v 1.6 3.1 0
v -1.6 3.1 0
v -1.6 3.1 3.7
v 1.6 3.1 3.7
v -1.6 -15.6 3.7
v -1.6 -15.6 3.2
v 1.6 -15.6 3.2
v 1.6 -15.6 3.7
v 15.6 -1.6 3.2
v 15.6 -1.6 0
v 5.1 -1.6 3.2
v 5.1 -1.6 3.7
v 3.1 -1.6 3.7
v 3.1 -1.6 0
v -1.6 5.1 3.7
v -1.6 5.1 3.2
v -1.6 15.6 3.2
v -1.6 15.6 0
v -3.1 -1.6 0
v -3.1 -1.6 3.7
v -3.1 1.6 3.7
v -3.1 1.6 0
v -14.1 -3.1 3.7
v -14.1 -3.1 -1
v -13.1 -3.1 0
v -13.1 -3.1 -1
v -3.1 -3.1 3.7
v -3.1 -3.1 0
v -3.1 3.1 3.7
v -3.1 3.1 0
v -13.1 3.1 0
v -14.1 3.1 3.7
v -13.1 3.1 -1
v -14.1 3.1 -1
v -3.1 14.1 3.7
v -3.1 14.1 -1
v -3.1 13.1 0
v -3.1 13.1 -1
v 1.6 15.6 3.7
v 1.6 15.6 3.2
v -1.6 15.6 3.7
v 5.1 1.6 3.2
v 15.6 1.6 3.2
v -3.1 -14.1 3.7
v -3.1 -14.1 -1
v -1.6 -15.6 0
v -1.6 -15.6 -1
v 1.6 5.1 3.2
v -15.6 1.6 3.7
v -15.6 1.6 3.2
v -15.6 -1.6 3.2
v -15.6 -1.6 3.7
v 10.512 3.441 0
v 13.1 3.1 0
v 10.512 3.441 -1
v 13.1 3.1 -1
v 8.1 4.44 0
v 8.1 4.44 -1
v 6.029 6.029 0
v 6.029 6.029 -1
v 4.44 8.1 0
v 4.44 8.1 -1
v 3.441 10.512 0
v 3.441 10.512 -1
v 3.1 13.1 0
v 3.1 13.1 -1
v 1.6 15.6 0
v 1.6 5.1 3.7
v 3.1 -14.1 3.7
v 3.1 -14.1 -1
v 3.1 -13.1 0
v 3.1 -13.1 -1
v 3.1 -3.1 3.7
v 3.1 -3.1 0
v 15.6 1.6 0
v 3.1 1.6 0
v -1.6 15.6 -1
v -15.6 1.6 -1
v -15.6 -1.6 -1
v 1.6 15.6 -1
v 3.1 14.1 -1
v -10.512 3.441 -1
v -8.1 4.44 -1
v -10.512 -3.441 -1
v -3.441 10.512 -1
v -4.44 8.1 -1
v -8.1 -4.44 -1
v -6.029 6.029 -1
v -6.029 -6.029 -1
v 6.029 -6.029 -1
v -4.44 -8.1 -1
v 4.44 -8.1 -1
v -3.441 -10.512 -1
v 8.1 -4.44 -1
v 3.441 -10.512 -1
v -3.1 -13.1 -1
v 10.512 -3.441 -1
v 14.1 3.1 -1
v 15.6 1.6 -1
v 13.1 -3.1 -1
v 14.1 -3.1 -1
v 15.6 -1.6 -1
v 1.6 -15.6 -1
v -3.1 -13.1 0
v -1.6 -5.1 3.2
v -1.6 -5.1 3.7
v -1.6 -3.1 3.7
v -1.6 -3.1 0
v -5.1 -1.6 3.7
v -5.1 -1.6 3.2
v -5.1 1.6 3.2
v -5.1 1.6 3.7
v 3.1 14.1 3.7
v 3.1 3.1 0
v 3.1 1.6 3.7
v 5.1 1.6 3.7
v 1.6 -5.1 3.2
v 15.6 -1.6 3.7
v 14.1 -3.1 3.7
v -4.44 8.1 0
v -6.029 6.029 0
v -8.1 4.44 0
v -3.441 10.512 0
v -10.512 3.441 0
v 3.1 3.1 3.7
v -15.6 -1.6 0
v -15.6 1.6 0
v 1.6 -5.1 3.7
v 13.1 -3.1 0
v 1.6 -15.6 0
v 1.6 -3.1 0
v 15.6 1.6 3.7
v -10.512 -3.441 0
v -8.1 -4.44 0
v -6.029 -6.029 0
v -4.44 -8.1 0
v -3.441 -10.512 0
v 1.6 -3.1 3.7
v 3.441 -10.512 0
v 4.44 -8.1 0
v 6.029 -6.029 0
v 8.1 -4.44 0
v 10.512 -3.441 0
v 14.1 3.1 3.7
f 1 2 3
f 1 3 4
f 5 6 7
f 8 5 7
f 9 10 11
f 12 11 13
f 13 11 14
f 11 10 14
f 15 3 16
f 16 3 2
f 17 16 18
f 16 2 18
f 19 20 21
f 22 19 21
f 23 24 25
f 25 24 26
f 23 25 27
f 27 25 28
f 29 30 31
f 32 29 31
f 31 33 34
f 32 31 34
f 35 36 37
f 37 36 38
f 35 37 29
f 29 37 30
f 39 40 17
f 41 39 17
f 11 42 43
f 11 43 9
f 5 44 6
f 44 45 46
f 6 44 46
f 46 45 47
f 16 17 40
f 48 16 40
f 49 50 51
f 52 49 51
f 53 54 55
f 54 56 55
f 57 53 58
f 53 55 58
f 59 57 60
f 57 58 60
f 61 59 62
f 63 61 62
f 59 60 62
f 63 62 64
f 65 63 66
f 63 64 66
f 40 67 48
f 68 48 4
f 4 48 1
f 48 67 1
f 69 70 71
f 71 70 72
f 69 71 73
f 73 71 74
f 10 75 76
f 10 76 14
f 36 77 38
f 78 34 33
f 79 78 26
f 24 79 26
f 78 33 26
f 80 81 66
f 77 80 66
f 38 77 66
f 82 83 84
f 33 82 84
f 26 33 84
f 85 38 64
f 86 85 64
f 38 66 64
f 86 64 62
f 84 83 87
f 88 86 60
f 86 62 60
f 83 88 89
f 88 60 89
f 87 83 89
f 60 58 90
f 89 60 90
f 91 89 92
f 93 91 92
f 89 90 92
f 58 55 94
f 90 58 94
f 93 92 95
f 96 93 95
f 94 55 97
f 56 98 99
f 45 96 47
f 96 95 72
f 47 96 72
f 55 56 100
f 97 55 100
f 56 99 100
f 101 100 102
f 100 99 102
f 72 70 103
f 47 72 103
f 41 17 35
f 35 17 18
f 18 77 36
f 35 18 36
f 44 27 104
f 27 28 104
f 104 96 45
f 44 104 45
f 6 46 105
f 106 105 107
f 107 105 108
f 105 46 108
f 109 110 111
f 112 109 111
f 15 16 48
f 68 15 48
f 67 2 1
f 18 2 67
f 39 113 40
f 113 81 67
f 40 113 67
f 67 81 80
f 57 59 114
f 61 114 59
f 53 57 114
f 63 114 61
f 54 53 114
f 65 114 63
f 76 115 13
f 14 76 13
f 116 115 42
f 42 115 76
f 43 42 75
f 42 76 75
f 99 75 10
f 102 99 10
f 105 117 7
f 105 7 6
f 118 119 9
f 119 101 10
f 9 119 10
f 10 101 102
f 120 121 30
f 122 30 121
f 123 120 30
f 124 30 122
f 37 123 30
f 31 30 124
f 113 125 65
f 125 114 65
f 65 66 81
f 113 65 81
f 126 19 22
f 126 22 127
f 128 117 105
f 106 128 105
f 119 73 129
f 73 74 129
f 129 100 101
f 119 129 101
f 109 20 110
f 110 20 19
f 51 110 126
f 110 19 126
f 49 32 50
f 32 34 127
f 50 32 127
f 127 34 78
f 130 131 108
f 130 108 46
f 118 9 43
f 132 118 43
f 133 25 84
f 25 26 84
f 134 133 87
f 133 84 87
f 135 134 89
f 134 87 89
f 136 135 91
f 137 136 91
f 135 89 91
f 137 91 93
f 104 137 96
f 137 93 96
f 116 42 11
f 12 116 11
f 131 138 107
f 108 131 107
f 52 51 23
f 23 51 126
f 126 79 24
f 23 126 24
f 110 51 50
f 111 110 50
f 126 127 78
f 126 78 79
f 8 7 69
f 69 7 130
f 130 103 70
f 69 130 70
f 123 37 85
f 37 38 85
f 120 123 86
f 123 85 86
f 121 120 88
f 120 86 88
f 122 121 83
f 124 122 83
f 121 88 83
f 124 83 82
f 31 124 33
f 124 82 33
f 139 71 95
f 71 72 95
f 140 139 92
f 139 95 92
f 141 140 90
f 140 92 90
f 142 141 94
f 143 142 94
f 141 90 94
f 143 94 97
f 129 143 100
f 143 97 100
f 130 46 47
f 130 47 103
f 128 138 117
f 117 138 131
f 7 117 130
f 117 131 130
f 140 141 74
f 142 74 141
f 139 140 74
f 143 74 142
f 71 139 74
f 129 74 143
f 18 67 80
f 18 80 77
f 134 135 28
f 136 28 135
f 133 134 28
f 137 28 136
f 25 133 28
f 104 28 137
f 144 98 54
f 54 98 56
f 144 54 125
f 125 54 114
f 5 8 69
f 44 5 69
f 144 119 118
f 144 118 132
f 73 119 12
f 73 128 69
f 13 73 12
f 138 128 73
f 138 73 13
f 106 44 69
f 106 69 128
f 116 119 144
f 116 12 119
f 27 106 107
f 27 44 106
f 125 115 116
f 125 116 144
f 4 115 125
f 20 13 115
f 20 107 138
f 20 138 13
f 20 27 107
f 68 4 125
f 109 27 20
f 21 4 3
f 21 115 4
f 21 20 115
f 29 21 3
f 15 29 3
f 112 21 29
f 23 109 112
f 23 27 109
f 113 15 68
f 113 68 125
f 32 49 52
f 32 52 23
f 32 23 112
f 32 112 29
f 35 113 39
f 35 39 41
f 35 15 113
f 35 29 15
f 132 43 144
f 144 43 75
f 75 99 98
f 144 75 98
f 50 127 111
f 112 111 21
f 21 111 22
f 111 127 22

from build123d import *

# Parameters (mm, degrees)
F0_W     = 1.6
F0_H     = 12.5
F0_W_2   = 12.5
F0_H_2   = 1.6
F1_DEPTH = 1
F2_R     = 10
F3_DEPTH = 3.2
F4_COUNT = 4
F5_W     = 3.2
F5_H     = 2
F6_DEPTH = 0.5
F7_COUNT = 4


# Not quite as in the source:
# - a feature names something its author has since deleted; it is built from what else it names


with BuildPart() as f1:
    # F0 (on Top) → F1 (new body)
    with BuildSketch(Plane.XY):
        Polygon((3.1, 14.1), (1.6, 15.6), (1.6, 3.1), (1.6, 1.6), (3.1, 1.6), (15.6, 1.6), (14.1, 3.1), (3.1, 3.1), align=None)
        with Locations((0.8, 9.35)):
            Rectangle(F0_W, F0_H)
        Polygon((1.6, 1.6), (1.6, 3.1), (0, 3.1), (0, 0), (3.1, 0), (3.1, 1.6), align=None)
        with Locations((9.35, 0.8)):
            Rectangle(F0_W_2, F0_H_2)
    extrude(amount=-F1_DEPTH)

    # F2
    f2_edges = [f1.edges().sort_by_distance(p)[0] for p in [
        (3.1, 3.1, -0.5),
    ]]
    fillet(f2_edges, radius=F2_R)

    # F0 (on Top) → F3 (join)
    with BuildSketch(Plane.XY):
        Polygon((3.1, 14.1), (1.6, 15.6), (1.6, 3.1), (1.6, 1.6), (3.1, 1.6), (15.6, 1.6), (14.1, 3.1), (3.1, 3.1), align=None)
        Polygon((1.6, 1.6), (1.6, 3.1), (0, 3.1), (0, 0), (3.1, 0), (3.1, 1.6), align=None)
    extrude(amount=F3_DEPTH)

    # F4: F1 ×4 about axis
    f4_axis = Axis((0, 0, -0.5), (0, 0, 1))


with BuildPart() as f1_1:
    add(f1.part)
    for i in range(1, F4_COUNT):
        add(f1.part.rotate(f4_axis, i * 360 / F4_COUNT))



with BuildPart() as f6:
    # F5 (on face) → F6 (new body)
    with BuildSketch(Plane.XY.offset(3.2)):
        Polygon((1.6, 15.6), (-1.6, 15.6), (-3.1, 14.1), (-3.1, 3.1), (0, 0), (3.1, 3.1), (3.1, 14.1), align=None)
        with Locations((0, 4.1)):
            Rectangle(F5_W, F5_H, mode=Mode.SUBTRACT)
    extrude(amount=F6_DEPTH)


with BuildPart() as f1_2:
    add(f1_1.part)

    add(f6.part)  # F7 merges F6
    # F7: F6 ×4 about axis
    f7_axis = Axis((0, 0, 3.45), (0, 0, -1))
    for i in range(1, F7_COUNT):
        add(f6.part.rotate(f7_axis, i * 360 / F7_COUNT))


solid = f1_2.part
